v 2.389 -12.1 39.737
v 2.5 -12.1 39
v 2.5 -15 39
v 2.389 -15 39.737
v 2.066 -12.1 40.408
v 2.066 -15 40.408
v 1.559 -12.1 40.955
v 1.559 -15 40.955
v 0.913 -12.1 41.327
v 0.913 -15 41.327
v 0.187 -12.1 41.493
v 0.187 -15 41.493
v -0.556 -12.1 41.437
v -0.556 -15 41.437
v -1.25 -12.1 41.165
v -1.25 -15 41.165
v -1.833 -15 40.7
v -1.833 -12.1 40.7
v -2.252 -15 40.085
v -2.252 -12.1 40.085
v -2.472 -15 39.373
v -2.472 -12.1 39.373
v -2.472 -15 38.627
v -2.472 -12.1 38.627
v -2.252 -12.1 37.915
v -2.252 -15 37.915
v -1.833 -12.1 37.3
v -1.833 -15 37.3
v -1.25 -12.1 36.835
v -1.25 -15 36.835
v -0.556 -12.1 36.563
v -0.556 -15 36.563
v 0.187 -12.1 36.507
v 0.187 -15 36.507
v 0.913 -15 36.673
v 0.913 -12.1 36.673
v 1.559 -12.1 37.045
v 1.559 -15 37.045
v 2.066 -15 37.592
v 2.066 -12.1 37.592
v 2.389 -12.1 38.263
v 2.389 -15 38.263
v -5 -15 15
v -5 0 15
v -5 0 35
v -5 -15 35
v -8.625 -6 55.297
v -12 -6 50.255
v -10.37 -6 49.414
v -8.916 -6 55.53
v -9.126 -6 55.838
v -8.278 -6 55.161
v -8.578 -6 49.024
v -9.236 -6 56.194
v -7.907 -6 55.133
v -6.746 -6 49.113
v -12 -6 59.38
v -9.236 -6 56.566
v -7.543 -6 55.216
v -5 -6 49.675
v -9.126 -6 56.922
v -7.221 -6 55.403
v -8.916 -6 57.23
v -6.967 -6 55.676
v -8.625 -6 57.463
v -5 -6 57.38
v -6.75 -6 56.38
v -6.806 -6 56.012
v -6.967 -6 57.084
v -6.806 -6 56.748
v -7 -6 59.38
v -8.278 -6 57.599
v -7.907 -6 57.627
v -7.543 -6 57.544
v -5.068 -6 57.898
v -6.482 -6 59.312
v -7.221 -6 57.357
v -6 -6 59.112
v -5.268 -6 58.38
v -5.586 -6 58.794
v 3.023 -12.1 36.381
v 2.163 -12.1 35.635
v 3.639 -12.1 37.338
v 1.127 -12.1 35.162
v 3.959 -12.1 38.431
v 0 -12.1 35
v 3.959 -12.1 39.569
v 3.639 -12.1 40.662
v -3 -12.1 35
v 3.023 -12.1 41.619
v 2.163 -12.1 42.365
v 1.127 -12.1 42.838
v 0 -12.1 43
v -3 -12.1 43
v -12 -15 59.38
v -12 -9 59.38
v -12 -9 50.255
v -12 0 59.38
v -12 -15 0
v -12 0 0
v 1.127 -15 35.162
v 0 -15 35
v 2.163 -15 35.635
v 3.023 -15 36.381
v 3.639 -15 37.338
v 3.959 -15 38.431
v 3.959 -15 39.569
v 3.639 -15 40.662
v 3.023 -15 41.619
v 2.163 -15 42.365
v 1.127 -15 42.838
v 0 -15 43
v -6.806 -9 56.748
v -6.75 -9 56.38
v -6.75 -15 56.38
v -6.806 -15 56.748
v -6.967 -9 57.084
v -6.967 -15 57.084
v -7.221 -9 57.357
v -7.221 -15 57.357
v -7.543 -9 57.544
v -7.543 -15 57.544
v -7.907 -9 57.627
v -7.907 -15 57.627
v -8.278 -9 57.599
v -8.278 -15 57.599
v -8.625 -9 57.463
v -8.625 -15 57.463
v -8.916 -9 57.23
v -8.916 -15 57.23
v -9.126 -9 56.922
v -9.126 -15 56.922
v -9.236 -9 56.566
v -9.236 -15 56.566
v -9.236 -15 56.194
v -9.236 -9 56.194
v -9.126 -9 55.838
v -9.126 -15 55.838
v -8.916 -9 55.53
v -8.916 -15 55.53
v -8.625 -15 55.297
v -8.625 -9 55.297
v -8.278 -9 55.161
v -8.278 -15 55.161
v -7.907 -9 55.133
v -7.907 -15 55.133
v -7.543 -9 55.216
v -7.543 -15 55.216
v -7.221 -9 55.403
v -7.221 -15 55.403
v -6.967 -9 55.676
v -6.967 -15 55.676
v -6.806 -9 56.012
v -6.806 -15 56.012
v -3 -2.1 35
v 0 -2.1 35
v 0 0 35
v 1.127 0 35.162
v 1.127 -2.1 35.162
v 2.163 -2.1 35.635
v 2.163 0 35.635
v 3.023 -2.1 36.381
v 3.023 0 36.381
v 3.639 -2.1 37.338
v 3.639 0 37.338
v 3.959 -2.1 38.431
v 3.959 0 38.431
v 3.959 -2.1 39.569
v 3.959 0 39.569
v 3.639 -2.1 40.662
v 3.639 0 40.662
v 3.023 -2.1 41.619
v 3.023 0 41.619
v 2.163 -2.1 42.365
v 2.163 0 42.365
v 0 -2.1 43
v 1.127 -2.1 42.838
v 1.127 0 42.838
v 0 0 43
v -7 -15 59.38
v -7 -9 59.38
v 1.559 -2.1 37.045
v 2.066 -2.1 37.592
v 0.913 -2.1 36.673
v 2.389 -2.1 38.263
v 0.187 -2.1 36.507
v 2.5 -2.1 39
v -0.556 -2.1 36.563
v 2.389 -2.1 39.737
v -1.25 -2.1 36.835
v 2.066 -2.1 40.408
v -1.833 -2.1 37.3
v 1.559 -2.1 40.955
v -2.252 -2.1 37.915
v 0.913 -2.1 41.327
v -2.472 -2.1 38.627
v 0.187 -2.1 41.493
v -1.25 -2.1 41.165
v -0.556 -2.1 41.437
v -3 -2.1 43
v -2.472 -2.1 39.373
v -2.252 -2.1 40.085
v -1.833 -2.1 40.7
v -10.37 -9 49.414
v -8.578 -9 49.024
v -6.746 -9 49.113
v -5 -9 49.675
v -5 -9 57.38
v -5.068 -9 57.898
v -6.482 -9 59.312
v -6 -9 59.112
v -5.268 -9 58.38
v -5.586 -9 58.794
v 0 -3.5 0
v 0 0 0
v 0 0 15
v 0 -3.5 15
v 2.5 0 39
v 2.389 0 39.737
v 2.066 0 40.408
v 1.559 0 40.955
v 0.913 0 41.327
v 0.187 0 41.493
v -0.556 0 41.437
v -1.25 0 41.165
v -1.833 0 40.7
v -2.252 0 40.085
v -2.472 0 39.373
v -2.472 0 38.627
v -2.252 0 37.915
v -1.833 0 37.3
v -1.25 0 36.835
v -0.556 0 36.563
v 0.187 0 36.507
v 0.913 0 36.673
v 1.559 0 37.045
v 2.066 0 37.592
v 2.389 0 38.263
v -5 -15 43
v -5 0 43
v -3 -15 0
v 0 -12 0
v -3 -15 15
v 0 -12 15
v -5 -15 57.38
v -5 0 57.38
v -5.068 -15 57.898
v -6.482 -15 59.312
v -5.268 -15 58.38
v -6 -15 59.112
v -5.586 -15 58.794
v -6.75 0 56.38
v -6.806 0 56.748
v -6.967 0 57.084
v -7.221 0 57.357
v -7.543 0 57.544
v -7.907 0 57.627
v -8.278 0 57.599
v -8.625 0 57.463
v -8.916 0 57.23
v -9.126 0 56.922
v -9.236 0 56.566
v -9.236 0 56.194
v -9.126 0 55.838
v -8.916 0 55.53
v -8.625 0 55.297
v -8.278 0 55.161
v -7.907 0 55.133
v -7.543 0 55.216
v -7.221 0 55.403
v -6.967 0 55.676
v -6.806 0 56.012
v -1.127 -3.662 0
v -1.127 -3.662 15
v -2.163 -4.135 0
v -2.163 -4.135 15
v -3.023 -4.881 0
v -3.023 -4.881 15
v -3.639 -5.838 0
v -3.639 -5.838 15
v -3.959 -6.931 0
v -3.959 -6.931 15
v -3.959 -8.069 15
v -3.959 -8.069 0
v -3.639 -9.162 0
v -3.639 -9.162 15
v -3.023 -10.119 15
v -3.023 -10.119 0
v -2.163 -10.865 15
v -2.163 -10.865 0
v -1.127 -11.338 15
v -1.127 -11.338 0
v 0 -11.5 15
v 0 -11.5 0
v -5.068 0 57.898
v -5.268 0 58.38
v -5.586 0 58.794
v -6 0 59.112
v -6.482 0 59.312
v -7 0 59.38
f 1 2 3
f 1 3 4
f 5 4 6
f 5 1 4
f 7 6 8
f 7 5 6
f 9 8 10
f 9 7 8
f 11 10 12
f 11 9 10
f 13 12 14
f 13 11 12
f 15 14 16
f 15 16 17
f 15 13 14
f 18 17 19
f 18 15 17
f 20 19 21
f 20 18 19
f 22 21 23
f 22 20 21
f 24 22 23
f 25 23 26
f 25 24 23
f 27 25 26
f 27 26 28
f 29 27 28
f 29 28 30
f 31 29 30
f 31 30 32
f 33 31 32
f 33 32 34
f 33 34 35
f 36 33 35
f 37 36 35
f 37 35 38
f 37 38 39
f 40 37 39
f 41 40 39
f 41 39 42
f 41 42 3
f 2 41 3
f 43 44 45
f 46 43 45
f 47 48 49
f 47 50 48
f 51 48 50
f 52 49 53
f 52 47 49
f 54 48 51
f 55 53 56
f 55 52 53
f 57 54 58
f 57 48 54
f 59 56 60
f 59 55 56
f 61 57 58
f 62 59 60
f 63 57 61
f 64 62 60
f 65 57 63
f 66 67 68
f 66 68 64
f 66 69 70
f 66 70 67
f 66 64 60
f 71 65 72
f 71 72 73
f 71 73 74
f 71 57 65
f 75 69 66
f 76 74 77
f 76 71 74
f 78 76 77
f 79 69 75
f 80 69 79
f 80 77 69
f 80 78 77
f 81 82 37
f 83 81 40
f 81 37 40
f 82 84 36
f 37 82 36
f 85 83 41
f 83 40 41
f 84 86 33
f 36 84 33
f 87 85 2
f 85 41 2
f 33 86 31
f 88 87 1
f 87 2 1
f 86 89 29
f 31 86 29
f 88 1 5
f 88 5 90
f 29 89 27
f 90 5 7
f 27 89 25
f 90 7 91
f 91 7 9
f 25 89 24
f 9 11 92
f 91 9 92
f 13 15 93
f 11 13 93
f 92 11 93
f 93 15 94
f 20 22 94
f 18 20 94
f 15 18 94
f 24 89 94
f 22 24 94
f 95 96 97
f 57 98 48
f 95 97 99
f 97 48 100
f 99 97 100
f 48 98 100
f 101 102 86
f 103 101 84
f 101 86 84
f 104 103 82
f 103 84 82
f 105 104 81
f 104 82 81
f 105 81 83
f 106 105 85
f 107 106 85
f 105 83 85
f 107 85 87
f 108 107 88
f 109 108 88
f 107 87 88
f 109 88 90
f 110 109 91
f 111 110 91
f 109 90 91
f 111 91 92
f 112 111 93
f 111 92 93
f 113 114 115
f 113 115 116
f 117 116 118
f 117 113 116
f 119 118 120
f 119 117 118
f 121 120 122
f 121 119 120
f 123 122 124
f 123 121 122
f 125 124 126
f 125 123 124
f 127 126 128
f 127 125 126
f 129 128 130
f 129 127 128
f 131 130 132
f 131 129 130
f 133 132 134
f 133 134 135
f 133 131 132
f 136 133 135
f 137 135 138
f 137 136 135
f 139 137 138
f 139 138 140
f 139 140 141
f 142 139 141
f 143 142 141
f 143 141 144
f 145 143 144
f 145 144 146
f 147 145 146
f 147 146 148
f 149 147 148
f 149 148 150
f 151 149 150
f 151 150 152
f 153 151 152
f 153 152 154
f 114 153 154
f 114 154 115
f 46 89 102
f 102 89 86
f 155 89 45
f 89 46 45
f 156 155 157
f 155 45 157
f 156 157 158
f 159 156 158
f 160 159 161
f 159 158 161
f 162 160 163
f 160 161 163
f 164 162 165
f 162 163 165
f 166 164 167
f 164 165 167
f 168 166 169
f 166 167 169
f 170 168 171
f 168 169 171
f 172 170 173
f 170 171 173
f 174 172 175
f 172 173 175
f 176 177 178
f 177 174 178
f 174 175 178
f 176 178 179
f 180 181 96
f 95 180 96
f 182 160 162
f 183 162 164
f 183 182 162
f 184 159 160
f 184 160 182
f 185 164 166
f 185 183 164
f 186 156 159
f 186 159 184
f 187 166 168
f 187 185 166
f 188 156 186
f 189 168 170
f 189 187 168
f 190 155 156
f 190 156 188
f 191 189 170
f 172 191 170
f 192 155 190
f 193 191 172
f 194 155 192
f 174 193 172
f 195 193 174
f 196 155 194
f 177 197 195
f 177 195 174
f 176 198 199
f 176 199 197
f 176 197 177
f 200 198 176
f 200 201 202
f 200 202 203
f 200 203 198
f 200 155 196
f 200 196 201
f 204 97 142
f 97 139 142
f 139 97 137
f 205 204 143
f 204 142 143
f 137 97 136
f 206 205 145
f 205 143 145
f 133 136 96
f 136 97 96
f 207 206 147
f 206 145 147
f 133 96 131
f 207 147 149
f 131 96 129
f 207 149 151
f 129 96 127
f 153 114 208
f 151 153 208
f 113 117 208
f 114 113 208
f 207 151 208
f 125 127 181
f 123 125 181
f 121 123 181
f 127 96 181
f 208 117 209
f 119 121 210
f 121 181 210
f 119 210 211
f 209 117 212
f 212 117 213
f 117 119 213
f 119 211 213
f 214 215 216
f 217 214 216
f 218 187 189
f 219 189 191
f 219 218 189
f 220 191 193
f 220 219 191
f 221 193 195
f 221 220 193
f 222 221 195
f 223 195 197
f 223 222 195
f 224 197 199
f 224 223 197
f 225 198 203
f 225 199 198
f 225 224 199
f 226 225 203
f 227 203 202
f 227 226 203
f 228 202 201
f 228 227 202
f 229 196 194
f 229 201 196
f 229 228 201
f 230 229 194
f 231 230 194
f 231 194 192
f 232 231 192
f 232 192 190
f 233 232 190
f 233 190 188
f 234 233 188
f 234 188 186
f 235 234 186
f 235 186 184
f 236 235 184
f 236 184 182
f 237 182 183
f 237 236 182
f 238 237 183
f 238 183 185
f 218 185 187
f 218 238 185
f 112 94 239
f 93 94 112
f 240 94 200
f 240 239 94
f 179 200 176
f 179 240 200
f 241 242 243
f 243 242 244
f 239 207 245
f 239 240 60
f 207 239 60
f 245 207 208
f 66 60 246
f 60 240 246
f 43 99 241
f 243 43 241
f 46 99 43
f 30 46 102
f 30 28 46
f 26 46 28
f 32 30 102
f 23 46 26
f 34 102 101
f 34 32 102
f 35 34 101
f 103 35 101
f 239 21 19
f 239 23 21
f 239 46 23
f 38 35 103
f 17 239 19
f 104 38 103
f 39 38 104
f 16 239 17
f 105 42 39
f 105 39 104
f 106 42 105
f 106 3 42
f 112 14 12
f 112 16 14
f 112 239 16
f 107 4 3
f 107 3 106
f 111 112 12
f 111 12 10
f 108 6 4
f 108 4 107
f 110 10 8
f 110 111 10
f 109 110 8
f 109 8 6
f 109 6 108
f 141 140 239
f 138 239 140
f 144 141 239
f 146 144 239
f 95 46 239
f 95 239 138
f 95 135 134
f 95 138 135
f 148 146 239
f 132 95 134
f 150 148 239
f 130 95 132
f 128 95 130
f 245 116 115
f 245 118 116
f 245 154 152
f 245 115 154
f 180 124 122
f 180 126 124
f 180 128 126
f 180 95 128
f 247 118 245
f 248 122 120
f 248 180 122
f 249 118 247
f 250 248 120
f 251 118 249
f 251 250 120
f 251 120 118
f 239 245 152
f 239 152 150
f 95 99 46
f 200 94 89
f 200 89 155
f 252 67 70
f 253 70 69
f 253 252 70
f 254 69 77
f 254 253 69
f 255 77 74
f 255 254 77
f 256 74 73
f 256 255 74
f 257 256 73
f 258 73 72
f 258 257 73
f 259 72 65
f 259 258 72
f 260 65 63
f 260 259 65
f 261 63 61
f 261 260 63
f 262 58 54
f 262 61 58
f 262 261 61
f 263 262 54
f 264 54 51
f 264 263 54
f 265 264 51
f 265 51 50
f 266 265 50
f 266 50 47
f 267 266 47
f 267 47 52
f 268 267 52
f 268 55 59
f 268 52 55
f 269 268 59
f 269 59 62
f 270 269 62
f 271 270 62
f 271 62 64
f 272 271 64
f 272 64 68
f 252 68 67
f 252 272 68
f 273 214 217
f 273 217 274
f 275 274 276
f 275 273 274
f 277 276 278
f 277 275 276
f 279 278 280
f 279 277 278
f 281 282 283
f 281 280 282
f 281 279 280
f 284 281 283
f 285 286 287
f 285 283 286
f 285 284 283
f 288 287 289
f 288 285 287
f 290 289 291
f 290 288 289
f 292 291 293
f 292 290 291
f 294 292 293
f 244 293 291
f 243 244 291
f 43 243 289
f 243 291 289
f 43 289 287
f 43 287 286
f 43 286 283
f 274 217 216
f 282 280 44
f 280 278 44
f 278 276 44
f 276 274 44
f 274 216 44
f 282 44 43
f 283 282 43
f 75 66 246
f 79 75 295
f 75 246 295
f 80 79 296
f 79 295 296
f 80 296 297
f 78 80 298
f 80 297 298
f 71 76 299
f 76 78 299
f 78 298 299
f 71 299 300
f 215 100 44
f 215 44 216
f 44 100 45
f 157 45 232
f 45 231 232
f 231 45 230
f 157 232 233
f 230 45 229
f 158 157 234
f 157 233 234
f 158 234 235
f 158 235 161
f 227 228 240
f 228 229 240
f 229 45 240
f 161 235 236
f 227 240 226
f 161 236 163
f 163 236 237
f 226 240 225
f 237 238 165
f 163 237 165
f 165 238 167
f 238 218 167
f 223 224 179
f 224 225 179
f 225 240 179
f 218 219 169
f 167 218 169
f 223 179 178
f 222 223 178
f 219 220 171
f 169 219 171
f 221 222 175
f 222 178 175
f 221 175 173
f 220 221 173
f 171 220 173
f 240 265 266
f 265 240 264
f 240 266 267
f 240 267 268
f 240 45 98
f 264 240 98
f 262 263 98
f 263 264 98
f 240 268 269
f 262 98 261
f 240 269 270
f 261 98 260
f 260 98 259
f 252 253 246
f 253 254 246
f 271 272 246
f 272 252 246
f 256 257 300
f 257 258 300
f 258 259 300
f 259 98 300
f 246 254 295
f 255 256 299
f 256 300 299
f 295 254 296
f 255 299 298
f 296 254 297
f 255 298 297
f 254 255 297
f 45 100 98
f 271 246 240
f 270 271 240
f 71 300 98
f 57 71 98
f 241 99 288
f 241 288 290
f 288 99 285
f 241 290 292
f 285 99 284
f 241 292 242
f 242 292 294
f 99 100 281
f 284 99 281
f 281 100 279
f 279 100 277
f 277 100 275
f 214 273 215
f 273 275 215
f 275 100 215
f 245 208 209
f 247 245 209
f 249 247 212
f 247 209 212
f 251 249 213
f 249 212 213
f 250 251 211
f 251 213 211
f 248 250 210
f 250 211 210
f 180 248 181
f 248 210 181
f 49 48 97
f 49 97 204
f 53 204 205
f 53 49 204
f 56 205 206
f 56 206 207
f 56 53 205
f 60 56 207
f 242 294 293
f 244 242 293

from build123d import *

# Parameters (mm, degrees)
SKETCH009_R       = 2.5
SKETCH009_R_2     = 1.25
PAD007_DEPTH      = 15
CYLINDER002_R     = 4
CYLINDER002_DEPTH = 27
CHAMFER001_SIZE2  = 3
CHAMFER001_SIZE   = 3
BOX_W             = 10
BOX_H             = 10.2
BOX_DEPTH         = 10
CYLINDER003_R     = 7
CYLINDER003_DEPTH = 3


with BuildPart() as part:
    # Sketch009 → Pad007 (new body)
    with BuildSketch(Plane.XZ):
        with BuildLine():
            Line((-12, 59.38), (-12, 0))
            Line((-12, 0), (0, 0))
            Line((0, 0), (0, 15))
            Line((0, 15), (-5, 15))
            Line((-5, 15), (-5, 35))
            Line((-5, 35), (0, 35))
            ThreePointArc((0, 35), (4, 39), (0, 43))
            Line((-5, 43), (0, 43))
            Line((-5, 43), (-5, 57.38))
            ThreePointArc((-5, 57.38), (-5.585786, 58.794214), (-7, 59.38))
            Line((-7, 59.38), (-12, 59.38))
        make_face()
        with Locations((0, 39)):
            Circle(SKETCH009_R, mode=Mode.SUBTRACT)
        with Locations((-8, 56.38)):
            Circle(SKETCH009_R_2, mode=Mode.SUBTRACT)
    extrude(amount=PAD007_DEPTH)

    # Cylinder002 → Cylinder002 (cut)
    with BuildSketch(Plane(origin=(0, -7.5, 0), x_dir=(1, 0, 0), z_dir=(0, 0, 1))):
        Circle(CYLINDER002_R)
    extrude(amount=CYLINDER002_DEPTH, mode=Mode.SUBTRACT)

    # Chamfer001
    chamfer001_edges = [part.edges().sort_by_distance(p)[0] for p in [
        (0, -15, 7.5),
    ]]
    chamfer001_side = part.faces().sort_by_distance((-7.04009, -15, 27.056502))[0]
    chamfer(chamfer001_edges, length=CHAMFER001_SIZE, length2=CHAMFER001_SIZE2, reference=chamfer001_side)

    # Box → Box (cut)
    with BuildSketch(Plane(origin=(-3, -12.1, 34), x_dir=(0, 1, 0), z_dir=(1, 0, 0))):
        with Locations((5, 5.1)):
            Rectangle(BOX_W, BOX_H)
    extrude(amount=BOX_DEPTH, mode=Mode.SUBTRACT)

    # Cylinder003 → Cylinder003 (cut)
    with BuildSketch(Plane(origin=(-8, -6, 56), x_dir=(1, 0, 0), z_dir=(0, -1, 0))):
        Circle(CYLINDER003_R)
    extrude(amount=CYLINDER003_DEPTH, mode=Mode.SUBTRACT)


solid = part.part
